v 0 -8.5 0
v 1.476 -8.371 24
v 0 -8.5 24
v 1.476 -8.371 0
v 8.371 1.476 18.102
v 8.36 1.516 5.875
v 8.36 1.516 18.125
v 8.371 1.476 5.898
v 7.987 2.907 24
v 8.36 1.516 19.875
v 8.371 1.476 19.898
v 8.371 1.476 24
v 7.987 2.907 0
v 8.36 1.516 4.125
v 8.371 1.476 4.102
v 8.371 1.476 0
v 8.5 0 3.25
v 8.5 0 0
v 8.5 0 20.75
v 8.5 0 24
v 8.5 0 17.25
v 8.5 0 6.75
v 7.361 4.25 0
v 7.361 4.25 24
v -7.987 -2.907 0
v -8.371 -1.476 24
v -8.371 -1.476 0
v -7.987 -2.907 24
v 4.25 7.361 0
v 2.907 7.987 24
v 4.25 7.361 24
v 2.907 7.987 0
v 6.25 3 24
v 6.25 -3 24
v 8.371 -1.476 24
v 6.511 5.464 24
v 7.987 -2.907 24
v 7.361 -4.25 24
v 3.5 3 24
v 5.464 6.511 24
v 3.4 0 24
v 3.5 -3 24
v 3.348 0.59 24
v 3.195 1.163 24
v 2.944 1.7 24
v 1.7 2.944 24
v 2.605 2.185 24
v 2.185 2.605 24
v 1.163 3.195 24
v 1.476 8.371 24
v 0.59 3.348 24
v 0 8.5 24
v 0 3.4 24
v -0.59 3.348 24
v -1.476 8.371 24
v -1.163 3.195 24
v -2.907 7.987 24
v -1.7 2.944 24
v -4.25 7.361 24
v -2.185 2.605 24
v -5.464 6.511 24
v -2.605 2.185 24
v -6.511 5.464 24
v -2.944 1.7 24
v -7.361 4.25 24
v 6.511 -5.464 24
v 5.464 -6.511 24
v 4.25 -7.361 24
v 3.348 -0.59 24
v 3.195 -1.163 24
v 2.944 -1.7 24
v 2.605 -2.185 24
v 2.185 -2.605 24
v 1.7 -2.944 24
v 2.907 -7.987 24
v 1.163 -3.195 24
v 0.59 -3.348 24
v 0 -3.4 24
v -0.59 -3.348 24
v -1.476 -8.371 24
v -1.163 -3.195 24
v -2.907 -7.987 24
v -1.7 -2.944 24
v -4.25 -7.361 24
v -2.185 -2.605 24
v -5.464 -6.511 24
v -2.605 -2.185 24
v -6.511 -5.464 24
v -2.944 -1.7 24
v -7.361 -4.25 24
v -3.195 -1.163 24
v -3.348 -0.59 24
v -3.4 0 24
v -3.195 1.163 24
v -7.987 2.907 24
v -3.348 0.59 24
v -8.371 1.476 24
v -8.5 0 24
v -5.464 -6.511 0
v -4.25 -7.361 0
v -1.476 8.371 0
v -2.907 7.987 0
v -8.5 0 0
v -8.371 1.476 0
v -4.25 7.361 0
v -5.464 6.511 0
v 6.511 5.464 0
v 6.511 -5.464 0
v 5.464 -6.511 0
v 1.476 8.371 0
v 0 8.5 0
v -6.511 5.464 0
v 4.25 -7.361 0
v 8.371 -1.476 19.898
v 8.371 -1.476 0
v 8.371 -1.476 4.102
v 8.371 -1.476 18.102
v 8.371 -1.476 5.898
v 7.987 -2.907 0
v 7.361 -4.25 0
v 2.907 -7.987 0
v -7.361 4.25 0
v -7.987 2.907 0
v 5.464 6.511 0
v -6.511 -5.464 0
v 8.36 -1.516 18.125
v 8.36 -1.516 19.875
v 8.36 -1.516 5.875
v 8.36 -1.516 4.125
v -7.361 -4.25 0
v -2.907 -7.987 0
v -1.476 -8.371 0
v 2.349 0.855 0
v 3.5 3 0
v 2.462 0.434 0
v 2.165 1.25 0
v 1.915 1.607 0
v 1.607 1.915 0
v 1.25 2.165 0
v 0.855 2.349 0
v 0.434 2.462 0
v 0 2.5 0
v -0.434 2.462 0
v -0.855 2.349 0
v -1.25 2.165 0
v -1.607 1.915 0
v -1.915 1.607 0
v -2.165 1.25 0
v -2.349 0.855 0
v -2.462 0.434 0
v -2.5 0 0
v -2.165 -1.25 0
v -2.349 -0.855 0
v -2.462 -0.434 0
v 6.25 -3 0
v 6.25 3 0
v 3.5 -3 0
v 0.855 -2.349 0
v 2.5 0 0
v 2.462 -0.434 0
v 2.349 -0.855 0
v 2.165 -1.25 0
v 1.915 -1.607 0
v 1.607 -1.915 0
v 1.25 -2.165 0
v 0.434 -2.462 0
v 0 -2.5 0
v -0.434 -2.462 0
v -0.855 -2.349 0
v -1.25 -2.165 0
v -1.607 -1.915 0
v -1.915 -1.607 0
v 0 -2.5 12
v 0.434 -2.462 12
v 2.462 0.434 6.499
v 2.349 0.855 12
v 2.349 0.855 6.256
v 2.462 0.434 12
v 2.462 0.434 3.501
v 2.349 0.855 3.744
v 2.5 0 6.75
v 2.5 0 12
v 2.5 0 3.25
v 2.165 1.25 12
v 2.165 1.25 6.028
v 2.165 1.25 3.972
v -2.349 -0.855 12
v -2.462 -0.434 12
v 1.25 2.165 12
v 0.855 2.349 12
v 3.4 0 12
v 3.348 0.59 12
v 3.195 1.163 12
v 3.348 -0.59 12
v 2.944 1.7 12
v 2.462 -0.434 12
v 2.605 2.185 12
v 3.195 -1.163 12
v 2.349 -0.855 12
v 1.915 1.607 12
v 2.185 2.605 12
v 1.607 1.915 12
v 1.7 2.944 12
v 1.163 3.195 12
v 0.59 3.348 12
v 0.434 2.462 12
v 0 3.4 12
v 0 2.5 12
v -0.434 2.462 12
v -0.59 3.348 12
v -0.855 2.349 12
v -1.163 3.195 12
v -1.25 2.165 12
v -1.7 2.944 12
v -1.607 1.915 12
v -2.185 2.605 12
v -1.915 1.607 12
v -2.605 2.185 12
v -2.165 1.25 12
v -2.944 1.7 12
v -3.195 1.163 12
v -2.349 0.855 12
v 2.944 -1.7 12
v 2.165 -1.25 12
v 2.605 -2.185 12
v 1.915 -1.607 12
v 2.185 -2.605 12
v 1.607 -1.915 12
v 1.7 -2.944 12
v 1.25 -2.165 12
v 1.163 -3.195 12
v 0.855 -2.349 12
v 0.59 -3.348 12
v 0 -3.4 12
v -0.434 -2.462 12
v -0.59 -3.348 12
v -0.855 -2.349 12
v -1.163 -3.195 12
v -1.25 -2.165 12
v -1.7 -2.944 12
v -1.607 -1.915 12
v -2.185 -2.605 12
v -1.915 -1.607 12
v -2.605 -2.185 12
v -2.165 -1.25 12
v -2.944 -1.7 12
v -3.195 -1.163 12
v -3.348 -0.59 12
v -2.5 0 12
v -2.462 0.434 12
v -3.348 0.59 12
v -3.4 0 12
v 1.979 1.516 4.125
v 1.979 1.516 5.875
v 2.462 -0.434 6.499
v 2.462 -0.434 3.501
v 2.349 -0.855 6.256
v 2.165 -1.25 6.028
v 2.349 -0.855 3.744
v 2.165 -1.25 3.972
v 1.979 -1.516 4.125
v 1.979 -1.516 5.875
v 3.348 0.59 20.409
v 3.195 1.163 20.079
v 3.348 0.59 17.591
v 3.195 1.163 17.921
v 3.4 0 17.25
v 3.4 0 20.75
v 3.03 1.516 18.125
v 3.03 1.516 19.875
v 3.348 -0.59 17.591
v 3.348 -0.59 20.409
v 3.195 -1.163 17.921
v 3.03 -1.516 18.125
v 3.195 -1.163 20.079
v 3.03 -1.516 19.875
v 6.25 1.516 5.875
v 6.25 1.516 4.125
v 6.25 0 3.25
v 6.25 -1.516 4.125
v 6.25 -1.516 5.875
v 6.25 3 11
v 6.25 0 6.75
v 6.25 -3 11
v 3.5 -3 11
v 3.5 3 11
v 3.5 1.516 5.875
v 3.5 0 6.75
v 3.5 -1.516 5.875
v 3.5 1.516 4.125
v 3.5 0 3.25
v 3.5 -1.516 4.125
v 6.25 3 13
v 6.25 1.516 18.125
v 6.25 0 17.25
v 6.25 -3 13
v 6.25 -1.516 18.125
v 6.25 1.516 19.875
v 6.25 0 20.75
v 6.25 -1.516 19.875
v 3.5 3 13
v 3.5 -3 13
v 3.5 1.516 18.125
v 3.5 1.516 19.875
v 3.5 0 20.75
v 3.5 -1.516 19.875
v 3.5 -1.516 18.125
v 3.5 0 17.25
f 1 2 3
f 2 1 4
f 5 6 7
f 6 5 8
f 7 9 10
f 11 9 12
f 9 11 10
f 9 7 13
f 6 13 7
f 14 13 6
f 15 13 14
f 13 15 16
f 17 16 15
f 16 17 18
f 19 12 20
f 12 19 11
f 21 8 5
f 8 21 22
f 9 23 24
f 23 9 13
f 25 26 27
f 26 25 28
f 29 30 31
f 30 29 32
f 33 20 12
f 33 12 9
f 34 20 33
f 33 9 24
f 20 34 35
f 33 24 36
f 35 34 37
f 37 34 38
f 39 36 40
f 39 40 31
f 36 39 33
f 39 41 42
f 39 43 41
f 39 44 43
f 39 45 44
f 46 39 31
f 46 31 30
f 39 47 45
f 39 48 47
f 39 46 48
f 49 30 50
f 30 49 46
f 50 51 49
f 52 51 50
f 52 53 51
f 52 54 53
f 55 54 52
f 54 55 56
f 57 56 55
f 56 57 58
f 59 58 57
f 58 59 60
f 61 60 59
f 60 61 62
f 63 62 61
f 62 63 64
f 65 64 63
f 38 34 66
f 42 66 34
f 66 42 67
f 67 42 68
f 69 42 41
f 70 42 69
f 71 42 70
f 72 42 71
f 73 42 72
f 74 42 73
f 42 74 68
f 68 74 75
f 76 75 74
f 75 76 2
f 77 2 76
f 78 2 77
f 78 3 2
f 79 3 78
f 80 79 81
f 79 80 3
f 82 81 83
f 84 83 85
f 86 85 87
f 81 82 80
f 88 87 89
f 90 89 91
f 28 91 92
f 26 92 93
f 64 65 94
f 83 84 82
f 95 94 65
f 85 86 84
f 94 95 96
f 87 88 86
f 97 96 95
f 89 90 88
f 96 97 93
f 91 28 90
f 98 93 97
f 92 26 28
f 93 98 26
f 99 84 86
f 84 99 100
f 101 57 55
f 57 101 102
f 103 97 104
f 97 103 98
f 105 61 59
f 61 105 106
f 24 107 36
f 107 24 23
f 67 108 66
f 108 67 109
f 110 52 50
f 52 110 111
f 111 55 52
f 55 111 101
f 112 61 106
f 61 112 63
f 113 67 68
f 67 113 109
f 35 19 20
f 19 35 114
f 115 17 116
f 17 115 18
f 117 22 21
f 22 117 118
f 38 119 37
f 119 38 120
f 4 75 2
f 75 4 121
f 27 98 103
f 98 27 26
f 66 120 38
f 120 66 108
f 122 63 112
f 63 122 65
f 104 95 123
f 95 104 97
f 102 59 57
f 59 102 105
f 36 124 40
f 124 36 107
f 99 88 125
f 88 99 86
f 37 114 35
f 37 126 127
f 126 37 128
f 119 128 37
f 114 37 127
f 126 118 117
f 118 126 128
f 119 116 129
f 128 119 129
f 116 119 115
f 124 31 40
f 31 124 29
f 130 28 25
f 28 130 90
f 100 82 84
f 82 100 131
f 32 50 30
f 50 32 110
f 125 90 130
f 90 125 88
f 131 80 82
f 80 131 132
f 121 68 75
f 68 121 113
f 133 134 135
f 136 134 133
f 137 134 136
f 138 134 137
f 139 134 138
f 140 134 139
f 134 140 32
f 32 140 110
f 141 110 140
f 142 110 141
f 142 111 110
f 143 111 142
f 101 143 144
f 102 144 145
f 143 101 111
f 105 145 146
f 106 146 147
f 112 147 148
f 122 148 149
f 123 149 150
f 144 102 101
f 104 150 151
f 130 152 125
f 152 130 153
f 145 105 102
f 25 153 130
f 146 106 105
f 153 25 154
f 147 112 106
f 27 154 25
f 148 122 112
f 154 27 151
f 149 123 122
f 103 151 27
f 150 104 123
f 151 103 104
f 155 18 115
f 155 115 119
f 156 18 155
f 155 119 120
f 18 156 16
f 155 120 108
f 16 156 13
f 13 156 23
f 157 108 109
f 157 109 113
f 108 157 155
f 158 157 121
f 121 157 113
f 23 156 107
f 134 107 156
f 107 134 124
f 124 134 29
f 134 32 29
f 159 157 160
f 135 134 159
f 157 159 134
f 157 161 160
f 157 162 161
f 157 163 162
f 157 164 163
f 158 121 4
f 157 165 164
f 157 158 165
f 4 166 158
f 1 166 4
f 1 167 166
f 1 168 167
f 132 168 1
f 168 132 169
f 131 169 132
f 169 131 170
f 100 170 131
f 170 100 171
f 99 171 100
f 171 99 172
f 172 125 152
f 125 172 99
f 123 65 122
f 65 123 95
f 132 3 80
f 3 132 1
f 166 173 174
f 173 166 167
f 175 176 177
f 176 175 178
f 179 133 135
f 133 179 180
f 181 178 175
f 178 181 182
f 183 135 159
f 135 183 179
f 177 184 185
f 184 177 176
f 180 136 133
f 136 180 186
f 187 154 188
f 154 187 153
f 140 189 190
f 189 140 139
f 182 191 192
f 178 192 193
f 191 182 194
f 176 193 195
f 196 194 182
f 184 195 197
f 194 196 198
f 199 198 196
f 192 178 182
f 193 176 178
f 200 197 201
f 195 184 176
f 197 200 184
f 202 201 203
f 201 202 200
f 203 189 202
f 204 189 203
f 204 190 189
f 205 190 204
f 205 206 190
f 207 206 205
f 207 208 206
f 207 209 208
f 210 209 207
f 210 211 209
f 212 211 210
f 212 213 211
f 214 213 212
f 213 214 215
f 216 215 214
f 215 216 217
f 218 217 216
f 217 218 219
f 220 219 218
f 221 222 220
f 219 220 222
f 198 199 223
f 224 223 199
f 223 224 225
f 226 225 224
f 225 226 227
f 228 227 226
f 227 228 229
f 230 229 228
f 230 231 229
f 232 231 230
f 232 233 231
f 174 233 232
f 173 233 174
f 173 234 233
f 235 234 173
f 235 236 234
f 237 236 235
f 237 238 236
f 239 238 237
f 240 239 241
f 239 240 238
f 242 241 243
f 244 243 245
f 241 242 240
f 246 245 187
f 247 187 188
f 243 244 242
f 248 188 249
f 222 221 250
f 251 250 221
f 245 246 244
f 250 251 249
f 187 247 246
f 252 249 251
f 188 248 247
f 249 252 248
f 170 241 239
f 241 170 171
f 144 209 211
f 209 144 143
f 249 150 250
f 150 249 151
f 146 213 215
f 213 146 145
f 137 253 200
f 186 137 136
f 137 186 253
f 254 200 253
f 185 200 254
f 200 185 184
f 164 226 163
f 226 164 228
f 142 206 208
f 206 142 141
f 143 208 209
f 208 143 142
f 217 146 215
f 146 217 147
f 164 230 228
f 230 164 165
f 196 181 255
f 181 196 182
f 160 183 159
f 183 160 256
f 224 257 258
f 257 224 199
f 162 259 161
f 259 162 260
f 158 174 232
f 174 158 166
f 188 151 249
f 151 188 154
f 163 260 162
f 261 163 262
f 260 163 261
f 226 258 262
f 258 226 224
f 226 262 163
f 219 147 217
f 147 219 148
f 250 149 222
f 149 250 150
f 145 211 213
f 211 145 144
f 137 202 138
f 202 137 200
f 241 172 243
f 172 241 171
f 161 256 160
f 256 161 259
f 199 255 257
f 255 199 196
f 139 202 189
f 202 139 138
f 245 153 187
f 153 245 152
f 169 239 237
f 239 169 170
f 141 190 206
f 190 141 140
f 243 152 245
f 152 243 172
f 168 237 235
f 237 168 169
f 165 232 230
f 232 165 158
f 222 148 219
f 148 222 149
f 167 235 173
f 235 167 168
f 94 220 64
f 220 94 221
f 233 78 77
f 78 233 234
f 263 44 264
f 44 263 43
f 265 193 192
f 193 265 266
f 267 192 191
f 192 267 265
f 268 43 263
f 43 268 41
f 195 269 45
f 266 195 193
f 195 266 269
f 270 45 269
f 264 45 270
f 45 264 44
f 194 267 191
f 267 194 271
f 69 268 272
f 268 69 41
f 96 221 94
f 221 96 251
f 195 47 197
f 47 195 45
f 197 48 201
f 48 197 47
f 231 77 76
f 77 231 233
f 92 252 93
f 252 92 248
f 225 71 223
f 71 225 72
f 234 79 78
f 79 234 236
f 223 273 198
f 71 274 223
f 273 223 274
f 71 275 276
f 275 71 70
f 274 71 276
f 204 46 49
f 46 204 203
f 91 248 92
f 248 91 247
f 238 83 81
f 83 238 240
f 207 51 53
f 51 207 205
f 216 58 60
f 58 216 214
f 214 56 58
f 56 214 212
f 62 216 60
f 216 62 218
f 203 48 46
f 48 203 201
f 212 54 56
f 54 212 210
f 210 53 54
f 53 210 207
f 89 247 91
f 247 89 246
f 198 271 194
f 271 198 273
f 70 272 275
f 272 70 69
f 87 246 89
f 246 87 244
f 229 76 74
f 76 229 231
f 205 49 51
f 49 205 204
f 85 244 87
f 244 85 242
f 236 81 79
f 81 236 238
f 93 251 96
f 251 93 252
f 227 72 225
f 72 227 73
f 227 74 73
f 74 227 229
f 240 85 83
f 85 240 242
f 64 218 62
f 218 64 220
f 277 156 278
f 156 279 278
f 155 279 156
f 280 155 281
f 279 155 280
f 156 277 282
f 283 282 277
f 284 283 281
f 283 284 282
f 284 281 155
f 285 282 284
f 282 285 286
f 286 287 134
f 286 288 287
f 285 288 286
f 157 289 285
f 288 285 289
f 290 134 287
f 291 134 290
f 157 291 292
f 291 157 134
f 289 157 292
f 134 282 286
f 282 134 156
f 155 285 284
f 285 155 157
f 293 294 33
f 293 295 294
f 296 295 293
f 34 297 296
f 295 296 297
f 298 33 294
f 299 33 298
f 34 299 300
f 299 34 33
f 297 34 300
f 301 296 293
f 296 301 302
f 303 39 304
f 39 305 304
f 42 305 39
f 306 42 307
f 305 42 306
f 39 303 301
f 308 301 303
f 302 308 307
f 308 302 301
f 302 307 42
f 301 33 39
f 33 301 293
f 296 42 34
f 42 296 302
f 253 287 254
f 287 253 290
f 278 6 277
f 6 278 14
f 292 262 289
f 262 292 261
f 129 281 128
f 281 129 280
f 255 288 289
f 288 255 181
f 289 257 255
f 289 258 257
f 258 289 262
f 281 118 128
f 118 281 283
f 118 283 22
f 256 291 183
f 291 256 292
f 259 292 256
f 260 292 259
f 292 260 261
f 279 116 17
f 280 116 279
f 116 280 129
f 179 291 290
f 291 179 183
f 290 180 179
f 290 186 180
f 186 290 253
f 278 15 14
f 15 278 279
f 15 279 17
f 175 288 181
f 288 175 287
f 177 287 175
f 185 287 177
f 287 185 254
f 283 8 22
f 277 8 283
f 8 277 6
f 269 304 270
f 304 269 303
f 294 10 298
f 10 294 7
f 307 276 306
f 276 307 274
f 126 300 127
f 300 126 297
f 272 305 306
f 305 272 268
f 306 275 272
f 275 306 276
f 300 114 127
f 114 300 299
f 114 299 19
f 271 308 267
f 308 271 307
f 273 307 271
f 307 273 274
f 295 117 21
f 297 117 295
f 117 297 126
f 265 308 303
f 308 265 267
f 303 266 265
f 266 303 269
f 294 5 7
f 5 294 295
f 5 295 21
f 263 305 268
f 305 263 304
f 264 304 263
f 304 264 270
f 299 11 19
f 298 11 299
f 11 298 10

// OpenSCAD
c_down_radius = 2.5;
c_down_heigth = 12;
c_up_radius = 3.4;
c_up_heigth = 12;
c_out_radius = 8.5;
c_slot_width = 6;
c_slot_depth = 2.75;
c_slot_offset = 3.5;
c_slot_bottom = 1;
c_bolt_radius = 1.75;
c_bolt_location = 5;

module coupling()
{
difference()
{
	// Coupling body
	cylinder(r=c_out_radius, h=c_up_heigth+c_down_heigth, $fn=36);
	
	// Bottom hole
	cylinder(r=c_down_radius, h=c_down_heigth, $fn=36);

	// Top hole
	translate([0,0,c_down_heigth])
		cylinder(r=c_up_radius, h=c_up_heigth, $fn=36);

	// Bottom slot
	translate([c_slot_offset,-1*c_slot_width/2,0])
		cube([c_slot_depth,c_slot_width,c_down_heigth-c_slot_bottom]);

	// Top slot
	translate([c_slot_offset,-1*c_slot_width/2,c_down_heigth+c_slot_bottom])
		cube([c_slot_depth,c_slot_width,c_up_heigth-c_slot_bottom]);

	// Bottom bolt hole
	translate([0,0,c_bolt_location])
		rotate(a=90, v=[0,1,0])
			rotate(a=180, v=[0,0,1])
				cylinder(r=c_bolt_radius, h=1.25*c_out_radius);

	// Top bolt hole
	translate([0,0,c_down_heigth+c_up_heigth-c_bolt_location])
		rotate(a=90, v=[0,1,0])
			rotate(a=180, v=[0,0,1])
				cylinder(r=c_bolt_radius, h=1.25*c_out_radius);
}
}

coupling();
